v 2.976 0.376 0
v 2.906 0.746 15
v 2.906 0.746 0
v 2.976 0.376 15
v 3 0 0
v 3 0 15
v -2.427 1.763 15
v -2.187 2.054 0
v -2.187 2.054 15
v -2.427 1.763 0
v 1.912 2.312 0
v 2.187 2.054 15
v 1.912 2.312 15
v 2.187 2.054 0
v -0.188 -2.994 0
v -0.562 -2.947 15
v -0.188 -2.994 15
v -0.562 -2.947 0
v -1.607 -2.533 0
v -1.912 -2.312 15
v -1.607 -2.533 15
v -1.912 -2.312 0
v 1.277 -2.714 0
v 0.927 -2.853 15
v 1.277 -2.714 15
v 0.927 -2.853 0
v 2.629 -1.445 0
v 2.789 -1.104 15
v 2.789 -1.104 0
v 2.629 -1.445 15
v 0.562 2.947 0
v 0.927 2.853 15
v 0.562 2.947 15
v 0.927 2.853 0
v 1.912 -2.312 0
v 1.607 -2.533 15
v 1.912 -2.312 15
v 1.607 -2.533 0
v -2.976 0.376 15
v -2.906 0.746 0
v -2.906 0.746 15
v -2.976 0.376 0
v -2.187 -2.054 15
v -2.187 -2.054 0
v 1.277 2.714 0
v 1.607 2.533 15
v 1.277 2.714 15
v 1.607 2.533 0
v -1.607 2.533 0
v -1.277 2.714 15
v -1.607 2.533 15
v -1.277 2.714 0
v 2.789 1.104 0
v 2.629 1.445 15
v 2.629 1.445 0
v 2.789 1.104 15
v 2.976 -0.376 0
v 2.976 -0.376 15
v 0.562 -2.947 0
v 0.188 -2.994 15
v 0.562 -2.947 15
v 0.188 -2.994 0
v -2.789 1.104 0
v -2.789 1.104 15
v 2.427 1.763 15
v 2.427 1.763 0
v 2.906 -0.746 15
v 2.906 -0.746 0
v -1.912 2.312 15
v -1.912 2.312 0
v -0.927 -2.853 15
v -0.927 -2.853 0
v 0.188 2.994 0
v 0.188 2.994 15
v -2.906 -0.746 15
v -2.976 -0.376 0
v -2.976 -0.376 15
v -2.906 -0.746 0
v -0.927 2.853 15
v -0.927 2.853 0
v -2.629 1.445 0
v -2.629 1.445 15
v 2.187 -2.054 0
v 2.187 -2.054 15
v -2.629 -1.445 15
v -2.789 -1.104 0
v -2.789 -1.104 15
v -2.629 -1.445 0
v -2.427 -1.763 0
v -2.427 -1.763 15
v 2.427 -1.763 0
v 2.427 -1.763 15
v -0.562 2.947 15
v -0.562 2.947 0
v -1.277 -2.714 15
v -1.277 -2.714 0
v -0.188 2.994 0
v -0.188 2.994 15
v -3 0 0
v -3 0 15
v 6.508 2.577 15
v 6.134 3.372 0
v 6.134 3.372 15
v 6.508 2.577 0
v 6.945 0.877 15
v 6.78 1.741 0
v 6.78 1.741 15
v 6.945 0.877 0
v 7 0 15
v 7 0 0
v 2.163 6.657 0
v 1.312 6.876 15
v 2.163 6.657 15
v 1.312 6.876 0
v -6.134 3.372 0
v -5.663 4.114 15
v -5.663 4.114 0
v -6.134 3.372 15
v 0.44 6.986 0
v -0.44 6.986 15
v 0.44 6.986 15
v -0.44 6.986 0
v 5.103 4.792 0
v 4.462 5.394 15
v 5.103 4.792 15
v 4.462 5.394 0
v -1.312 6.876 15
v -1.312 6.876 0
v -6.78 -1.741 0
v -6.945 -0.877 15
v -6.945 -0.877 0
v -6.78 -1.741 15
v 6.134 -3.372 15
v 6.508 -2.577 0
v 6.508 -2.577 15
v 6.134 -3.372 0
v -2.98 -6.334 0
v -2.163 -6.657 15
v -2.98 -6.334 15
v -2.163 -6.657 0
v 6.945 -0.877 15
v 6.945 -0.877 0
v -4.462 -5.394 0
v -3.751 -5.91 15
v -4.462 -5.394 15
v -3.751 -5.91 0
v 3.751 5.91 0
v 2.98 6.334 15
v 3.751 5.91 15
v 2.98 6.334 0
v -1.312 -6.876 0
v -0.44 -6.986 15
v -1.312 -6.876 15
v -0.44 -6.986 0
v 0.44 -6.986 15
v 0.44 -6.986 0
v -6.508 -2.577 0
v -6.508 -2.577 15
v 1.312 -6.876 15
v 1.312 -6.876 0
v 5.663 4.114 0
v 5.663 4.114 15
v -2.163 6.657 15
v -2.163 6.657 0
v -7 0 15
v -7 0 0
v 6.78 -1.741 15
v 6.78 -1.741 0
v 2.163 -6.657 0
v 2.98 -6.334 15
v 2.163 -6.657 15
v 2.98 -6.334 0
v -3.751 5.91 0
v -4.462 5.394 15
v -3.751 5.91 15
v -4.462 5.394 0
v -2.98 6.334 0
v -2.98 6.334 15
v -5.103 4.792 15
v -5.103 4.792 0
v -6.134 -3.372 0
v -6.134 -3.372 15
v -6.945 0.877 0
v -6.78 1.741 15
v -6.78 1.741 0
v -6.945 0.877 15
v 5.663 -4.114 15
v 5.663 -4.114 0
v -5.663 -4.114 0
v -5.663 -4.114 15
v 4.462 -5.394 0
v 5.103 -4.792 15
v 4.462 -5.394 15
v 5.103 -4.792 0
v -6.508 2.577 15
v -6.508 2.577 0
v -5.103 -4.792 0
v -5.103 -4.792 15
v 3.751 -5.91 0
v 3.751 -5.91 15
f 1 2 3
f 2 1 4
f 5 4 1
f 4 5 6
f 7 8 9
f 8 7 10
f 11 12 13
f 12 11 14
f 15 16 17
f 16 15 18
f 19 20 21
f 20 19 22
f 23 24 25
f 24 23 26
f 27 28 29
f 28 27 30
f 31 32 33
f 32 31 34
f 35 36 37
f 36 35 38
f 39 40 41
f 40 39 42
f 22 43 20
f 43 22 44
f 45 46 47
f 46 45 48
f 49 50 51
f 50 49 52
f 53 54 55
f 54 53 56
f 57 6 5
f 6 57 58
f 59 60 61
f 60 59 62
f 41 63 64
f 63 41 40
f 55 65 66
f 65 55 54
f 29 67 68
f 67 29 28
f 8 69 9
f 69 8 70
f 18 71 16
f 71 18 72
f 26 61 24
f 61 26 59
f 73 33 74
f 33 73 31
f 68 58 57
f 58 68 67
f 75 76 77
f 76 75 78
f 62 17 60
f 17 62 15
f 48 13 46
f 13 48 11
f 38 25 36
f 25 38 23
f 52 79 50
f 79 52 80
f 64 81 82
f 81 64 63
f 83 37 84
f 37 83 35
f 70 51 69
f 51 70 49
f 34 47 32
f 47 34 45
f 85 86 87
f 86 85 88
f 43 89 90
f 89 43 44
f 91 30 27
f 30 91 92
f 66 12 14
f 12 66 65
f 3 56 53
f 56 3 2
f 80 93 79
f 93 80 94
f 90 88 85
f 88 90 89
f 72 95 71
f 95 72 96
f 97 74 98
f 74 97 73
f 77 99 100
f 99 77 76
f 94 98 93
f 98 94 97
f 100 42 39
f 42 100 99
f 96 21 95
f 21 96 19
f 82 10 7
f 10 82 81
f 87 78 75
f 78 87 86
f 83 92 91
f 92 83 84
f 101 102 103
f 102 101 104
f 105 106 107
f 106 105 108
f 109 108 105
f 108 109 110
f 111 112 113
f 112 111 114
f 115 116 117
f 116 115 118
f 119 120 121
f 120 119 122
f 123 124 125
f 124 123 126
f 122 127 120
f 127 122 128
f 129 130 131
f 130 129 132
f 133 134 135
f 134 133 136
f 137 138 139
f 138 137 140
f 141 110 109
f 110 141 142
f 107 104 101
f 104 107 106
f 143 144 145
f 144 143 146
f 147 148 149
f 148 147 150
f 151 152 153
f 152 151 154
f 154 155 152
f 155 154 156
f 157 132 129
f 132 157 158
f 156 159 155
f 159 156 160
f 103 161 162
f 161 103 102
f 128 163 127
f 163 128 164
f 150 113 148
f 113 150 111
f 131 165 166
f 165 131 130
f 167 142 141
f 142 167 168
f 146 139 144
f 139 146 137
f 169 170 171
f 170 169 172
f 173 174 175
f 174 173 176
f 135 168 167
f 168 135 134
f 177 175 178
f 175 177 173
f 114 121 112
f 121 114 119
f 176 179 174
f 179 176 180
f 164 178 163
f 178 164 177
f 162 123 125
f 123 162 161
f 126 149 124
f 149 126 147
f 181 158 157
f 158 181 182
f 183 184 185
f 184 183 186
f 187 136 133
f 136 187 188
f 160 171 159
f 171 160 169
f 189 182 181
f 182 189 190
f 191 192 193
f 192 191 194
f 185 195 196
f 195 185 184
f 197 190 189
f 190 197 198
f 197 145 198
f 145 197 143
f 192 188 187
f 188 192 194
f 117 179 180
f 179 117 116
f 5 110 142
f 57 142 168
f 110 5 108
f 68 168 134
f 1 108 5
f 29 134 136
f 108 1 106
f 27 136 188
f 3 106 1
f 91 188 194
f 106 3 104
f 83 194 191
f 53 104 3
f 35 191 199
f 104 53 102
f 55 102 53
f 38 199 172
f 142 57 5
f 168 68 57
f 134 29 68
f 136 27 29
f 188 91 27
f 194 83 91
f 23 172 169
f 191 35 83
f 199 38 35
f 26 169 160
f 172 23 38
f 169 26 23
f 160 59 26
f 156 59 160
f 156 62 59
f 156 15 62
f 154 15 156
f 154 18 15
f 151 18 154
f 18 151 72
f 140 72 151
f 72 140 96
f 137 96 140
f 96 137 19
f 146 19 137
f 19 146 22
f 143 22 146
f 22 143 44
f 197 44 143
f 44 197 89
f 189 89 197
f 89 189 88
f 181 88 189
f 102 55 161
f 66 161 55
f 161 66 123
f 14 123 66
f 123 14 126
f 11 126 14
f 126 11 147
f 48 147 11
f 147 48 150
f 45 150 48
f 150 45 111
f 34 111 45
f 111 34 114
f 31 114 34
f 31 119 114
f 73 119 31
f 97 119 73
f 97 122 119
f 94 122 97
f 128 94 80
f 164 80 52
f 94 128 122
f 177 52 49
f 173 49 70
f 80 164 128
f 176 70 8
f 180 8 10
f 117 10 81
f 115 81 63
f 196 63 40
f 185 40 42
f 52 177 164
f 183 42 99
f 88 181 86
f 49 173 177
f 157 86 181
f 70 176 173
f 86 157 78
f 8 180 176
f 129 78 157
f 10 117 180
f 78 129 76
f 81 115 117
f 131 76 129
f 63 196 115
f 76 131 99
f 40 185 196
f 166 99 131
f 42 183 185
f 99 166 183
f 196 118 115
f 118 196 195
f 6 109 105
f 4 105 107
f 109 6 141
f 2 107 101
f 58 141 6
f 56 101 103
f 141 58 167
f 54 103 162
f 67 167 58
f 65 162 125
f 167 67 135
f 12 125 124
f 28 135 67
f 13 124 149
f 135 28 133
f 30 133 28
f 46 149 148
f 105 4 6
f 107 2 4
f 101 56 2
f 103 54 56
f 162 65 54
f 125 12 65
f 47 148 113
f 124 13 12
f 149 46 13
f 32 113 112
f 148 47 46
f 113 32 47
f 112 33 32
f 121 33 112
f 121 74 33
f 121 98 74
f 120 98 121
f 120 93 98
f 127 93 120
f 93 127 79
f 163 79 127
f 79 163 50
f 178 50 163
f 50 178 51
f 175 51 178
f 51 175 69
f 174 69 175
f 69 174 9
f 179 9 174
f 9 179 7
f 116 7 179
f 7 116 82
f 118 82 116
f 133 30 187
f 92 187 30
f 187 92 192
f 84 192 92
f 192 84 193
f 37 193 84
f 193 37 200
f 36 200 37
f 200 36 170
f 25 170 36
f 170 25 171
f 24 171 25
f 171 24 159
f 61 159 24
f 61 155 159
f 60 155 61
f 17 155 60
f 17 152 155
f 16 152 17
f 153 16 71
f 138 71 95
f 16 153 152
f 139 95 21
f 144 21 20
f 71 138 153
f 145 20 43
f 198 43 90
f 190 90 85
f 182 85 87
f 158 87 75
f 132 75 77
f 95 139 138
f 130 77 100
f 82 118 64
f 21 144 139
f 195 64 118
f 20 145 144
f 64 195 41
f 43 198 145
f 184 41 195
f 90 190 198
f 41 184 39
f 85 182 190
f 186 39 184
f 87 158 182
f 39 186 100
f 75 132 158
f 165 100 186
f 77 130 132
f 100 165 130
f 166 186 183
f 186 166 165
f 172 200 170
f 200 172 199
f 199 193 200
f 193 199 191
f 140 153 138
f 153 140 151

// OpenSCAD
$fn = 50;


difference() {
	union() {
		*color(alpha = 1.0000000000, c = "gray") {
			translate(v = [0, 7, 0]) {
				linear_extrude(height = 1) {
					text(font = "Arial:style=Bold", halign = "center", size = 4.5000000000, text = "COMMENT plate main", valign = "center");
				}
			}
		}
		cylinder(h = 15, r = 7.0000000000);
	}
	union() {
		*color(alpha = 1.0000000000, c = "gray") {
			translate(v = [0, 7, 0]) {
				linear_extrude(height = 1) {
					text(font = "Arial:style=Bold", halign = "center", size = 4.5000000000, text = "COMMENT holes main", valign = "center");
				}
			}
		}
		translate(v = [0, 0, -100]) {
			cylinder(h = 200, r = 3.0000000000);
		}
		translate(v = [0, 0, -100]) {
			cylinder(h = 200, r = 1.5000000000);
		}
	}
}
